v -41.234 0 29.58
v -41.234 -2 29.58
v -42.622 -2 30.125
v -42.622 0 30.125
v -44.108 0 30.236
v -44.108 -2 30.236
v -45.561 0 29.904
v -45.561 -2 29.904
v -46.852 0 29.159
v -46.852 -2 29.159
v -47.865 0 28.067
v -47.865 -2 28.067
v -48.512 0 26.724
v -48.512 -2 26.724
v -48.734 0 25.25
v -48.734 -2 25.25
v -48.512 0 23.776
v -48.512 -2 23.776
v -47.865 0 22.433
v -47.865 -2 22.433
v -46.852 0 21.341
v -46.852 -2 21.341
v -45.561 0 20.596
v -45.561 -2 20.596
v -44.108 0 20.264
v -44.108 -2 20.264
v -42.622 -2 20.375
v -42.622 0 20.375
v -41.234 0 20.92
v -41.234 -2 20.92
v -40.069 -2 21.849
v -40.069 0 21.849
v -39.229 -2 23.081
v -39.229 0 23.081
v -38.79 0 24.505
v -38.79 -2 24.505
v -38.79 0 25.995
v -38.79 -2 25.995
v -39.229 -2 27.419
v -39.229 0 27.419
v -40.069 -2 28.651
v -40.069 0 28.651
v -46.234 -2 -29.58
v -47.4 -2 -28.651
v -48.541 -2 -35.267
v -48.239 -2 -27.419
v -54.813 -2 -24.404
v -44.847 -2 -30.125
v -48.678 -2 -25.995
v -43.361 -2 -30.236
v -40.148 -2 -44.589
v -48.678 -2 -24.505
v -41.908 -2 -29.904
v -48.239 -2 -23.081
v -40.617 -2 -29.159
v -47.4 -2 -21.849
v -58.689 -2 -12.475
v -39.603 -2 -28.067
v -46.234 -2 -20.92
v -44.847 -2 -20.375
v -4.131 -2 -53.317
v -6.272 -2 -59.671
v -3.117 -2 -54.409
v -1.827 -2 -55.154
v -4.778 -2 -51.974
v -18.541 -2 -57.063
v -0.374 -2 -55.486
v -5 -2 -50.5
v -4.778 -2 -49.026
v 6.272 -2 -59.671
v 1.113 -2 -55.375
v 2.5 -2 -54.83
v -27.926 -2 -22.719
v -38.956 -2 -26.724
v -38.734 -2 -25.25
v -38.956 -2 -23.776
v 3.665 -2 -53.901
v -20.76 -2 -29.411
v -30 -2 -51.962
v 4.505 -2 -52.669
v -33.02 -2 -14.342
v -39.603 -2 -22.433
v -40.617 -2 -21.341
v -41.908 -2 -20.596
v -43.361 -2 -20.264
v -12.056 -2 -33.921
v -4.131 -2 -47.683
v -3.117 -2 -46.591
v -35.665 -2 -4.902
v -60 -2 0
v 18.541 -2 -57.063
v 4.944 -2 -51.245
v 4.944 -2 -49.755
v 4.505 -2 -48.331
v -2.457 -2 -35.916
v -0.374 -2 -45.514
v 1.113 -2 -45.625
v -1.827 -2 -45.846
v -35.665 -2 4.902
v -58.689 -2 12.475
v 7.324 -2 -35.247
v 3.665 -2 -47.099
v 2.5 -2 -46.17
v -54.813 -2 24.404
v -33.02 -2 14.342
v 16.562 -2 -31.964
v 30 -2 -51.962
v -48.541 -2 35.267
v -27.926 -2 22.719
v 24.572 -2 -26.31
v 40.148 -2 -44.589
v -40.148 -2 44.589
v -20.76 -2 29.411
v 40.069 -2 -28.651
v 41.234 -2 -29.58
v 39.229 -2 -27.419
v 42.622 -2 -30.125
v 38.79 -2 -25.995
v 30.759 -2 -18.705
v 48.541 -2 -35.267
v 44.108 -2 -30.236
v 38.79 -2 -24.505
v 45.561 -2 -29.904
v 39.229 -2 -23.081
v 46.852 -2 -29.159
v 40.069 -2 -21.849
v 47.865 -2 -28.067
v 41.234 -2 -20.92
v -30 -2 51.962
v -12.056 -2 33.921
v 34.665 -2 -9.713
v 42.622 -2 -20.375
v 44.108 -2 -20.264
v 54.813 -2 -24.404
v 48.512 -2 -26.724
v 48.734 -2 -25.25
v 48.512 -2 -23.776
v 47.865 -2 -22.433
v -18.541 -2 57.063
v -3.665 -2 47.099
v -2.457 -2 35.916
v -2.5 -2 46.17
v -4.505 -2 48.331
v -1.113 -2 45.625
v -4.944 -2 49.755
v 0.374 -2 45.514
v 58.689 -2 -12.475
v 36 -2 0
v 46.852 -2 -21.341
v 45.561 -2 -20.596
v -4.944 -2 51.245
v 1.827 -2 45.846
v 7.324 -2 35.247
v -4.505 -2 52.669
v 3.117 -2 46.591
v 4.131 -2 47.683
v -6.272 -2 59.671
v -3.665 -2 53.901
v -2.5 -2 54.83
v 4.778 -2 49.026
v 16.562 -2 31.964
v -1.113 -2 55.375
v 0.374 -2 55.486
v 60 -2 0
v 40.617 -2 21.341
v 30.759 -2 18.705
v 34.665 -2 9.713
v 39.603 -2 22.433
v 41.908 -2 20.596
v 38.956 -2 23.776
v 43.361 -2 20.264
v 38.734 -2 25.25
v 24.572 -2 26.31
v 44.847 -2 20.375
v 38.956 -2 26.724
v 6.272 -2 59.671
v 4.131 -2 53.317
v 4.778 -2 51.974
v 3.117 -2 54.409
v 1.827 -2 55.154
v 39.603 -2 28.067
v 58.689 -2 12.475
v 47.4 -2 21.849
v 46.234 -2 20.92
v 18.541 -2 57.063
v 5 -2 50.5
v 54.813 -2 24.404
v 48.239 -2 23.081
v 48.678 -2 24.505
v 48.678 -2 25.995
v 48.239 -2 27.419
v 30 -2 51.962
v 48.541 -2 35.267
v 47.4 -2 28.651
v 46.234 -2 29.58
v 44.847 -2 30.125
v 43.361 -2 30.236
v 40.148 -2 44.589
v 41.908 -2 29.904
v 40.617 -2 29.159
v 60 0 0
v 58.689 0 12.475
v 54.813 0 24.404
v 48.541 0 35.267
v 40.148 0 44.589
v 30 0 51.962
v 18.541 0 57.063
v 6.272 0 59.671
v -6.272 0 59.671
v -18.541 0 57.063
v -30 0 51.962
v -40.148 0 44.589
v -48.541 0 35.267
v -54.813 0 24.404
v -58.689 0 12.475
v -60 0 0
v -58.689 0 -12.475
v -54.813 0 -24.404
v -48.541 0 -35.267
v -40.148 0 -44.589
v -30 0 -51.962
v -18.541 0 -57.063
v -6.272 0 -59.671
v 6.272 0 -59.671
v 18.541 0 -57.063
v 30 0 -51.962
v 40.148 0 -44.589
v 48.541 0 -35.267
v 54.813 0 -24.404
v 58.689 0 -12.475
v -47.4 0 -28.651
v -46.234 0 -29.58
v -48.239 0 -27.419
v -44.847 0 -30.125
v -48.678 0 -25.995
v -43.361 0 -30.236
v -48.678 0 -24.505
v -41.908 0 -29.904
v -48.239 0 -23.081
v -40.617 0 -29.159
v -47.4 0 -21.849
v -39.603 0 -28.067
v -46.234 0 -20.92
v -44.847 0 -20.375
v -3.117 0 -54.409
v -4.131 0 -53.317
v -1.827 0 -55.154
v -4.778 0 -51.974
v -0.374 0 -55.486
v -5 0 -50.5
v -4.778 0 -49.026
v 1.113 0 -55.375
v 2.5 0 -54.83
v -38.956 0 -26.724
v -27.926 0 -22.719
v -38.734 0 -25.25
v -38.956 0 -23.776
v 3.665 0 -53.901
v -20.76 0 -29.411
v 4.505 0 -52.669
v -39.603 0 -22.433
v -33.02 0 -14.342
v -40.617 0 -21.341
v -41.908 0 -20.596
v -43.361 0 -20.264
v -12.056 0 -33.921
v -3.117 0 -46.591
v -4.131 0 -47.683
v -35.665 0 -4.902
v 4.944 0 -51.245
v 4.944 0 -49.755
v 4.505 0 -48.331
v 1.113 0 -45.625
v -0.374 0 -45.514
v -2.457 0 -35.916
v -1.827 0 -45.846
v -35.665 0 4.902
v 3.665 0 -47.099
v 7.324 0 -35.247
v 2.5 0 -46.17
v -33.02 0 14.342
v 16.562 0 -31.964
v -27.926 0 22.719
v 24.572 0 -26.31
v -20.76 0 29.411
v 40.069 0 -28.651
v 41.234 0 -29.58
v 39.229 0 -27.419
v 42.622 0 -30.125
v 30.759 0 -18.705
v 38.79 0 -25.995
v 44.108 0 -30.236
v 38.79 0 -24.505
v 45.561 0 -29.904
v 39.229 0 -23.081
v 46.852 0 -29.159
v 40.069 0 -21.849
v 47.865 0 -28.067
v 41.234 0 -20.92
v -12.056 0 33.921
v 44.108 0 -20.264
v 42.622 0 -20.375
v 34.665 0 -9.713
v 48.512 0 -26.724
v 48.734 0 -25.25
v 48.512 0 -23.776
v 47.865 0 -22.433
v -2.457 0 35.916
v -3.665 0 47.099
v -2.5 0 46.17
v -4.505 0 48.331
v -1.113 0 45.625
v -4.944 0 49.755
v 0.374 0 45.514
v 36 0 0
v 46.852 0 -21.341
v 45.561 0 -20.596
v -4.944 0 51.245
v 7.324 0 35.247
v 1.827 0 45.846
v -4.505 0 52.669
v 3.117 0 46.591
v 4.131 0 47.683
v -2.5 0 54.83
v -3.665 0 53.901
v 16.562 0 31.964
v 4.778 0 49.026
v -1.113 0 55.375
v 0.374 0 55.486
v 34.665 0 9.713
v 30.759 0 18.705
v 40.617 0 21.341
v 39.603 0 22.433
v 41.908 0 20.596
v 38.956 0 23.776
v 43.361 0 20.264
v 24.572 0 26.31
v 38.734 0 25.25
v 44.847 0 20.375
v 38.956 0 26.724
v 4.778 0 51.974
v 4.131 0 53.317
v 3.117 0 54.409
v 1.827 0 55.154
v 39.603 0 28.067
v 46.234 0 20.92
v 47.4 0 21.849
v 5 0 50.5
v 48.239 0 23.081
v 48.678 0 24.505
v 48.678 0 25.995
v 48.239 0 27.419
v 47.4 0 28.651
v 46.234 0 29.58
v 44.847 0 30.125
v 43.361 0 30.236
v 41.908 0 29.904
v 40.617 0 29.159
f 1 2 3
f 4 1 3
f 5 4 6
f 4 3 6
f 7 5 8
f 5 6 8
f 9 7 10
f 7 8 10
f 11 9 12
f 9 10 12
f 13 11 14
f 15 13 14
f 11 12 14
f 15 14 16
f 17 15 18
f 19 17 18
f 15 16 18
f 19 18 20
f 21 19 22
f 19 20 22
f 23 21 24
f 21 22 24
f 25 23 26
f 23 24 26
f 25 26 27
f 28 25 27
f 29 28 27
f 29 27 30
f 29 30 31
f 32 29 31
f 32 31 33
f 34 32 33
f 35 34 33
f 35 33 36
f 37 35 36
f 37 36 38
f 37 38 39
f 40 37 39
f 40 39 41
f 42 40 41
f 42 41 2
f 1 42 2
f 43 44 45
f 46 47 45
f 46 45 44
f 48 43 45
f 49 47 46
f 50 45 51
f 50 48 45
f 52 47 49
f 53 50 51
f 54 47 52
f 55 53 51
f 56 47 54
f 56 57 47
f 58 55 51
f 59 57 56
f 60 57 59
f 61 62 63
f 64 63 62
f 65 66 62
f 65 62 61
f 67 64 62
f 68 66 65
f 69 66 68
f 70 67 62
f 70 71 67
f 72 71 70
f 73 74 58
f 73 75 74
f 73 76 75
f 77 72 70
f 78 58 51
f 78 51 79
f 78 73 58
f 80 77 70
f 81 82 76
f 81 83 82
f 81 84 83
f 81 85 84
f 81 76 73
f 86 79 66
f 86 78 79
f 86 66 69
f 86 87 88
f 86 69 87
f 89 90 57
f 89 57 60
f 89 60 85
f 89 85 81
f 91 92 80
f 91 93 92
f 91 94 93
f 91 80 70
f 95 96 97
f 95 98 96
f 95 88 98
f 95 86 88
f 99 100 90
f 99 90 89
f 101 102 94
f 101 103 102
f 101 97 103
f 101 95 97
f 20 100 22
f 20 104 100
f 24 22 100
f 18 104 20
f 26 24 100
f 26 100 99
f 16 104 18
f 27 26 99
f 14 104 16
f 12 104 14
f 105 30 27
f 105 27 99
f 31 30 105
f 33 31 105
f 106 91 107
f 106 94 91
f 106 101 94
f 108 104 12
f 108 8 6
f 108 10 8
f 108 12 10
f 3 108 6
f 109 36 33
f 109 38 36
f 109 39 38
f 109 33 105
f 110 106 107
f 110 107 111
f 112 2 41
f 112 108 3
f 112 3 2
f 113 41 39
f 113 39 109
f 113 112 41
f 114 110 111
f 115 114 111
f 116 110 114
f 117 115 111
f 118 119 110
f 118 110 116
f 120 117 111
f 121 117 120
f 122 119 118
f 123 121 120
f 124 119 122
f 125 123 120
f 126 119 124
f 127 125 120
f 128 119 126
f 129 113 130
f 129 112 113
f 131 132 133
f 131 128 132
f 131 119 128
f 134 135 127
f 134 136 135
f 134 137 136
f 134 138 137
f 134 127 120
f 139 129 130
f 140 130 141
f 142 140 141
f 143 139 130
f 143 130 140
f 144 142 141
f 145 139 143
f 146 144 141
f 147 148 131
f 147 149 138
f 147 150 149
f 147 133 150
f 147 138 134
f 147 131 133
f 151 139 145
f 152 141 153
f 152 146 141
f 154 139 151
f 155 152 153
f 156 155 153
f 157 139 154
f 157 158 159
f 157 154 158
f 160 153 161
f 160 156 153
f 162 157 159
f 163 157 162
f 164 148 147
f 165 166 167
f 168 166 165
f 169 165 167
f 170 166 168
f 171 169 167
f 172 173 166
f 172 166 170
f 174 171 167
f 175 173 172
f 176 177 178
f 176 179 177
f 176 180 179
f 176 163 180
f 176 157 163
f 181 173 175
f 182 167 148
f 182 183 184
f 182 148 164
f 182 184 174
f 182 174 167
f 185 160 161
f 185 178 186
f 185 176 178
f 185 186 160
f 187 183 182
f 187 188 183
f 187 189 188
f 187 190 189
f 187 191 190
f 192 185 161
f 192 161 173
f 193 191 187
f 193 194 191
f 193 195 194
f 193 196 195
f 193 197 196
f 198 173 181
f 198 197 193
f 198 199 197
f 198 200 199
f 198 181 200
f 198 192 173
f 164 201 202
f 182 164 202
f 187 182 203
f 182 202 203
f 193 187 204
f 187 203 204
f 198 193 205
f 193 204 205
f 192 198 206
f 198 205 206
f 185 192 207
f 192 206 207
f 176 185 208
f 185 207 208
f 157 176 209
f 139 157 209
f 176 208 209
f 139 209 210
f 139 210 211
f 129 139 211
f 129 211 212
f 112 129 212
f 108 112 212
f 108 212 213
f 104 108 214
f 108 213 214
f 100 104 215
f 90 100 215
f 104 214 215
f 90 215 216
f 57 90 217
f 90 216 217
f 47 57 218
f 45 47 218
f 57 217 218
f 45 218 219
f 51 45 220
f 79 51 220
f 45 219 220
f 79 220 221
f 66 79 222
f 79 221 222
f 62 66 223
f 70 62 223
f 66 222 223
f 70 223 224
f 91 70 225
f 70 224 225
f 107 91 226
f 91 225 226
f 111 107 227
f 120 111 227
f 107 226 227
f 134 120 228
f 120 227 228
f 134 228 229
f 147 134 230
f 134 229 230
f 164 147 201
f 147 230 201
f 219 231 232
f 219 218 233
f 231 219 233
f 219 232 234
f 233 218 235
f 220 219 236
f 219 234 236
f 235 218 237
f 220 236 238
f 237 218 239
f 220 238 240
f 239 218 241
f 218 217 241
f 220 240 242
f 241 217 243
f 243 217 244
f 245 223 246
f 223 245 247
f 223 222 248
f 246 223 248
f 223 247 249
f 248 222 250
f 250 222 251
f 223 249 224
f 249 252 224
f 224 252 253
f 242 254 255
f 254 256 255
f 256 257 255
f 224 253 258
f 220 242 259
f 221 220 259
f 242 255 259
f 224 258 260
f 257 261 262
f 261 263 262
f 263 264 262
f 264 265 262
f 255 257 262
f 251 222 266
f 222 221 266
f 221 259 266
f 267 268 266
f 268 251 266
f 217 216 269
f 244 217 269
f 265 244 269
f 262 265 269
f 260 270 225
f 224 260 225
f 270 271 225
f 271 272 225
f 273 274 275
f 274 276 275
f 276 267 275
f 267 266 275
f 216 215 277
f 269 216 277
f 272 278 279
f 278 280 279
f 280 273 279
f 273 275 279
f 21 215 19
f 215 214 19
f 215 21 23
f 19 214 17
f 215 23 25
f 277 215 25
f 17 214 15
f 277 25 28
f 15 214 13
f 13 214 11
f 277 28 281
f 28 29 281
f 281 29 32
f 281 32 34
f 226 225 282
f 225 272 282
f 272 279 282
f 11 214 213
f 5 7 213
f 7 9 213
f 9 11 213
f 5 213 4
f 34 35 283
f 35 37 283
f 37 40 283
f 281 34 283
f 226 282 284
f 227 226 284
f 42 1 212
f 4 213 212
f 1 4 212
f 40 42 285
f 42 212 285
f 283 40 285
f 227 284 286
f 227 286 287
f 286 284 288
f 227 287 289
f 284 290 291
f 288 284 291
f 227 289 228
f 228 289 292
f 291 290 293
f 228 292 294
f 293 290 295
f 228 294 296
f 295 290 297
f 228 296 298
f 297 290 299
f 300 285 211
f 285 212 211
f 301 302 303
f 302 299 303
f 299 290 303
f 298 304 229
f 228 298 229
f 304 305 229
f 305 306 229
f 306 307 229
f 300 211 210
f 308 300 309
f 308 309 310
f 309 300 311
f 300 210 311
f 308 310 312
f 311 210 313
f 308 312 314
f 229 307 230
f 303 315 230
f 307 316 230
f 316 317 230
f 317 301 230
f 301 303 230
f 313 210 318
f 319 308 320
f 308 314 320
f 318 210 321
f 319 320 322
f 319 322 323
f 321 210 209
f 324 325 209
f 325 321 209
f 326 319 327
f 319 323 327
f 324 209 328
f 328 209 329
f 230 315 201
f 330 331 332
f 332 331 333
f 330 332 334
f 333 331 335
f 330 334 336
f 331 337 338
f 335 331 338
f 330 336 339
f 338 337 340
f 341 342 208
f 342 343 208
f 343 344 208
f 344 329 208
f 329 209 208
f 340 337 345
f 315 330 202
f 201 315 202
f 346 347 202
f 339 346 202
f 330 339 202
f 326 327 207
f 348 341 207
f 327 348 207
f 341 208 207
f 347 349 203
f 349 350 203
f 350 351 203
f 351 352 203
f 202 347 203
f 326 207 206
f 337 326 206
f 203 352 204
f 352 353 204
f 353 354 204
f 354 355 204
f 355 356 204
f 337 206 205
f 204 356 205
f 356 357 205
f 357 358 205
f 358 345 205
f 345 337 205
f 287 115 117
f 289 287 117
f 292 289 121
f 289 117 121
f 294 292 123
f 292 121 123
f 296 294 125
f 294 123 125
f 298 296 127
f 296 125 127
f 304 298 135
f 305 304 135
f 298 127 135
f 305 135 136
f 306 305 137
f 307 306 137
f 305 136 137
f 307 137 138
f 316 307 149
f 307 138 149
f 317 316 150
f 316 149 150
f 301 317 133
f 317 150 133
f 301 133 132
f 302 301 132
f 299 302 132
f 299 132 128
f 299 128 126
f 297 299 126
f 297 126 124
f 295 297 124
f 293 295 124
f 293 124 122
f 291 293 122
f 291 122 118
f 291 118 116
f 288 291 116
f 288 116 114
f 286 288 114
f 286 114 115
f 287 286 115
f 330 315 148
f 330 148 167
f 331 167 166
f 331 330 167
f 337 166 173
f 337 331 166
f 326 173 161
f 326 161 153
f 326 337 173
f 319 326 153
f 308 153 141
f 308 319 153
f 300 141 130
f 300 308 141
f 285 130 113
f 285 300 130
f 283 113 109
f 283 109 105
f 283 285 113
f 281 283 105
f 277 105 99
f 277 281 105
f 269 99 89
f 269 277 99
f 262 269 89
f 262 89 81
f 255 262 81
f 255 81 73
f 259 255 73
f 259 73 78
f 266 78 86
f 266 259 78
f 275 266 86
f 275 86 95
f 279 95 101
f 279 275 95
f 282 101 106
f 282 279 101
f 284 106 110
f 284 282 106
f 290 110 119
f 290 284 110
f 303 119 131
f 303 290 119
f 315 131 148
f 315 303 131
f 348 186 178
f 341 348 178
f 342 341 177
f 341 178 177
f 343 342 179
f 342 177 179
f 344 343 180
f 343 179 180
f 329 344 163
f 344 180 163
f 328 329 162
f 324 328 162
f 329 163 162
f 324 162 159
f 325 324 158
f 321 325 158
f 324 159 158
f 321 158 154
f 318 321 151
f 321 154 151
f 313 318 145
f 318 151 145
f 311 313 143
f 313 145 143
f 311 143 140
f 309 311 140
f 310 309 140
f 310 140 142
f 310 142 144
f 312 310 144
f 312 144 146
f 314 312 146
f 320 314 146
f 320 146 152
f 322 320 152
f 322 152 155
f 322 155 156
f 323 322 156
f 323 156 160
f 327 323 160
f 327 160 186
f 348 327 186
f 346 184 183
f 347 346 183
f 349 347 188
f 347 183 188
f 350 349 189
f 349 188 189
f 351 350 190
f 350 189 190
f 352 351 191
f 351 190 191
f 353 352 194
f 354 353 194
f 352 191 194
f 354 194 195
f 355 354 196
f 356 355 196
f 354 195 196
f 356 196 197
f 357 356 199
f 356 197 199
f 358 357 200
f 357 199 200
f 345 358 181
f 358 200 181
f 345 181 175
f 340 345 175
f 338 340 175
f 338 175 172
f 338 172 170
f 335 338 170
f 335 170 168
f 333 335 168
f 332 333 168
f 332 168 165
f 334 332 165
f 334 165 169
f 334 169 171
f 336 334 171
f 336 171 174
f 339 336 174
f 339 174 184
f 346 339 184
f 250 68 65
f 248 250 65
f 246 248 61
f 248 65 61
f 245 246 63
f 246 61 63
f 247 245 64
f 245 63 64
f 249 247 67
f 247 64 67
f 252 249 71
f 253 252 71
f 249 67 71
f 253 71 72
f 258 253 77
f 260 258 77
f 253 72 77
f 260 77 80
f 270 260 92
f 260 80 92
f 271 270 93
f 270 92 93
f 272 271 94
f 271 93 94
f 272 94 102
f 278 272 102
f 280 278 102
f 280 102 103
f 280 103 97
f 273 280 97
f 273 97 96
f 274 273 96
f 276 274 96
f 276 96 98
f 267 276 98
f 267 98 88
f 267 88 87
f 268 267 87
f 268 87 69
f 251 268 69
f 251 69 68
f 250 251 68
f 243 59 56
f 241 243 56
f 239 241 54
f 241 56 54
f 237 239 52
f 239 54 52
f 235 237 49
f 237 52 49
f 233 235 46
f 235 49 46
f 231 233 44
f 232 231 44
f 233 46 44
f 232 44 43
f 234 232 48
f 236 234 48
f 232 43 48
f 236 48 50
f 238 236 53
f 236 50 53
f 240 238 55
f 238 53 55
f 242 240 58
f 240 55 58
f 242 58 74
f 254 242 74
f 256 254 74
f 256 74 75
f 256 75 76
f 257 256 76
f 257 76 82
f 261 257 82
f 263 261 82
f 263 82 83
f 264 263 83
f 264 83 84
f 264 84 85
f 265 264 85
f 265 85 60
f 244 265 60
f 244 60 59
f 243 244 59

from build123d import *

# Parameters (mm, degrees)
F0_R            = 60
F0_R_2          = 36
F1_DEPTH        = 2
F2_R            = 5
F3_DEPTH        = 2.001
F3_COPIES_COUNT = 6


# Not quite as in the source:
# - a pattern or mirror of a feature is missing from the dataset's text; its kind, count and spacing are read off the source's solid


with BuildPart() as f1:
    # F0 (on Front) → F1 (new body)
    with BuildSketch(Plane.XZ):
        Circle(F0_R)
        Circle(F0_R_2, mode=Mode.SUBTRACT)
    extrude(amount=F1_DEPTH)

    # F2 (on face) → F3 (cut, through all)
    with BuildSketch(Plane.XZ.offset(2)):
        with Locations((0, 50.5)):
            Circle(F2_R)
    f3 = extrude(amount=-F3_DEPTH, mode=Mode.SUBTRACT)

    # F3_copies: F3 ×6 about axis
    f3_copies_axis = Axis((0, 0, 0), (0, 1, 0))
    for i in range(1, F3_COPIES_COUNT):
        add(f3.rotate(f3_copies_axis, i * 360 / F3_COPIES_COUNT), mode=Mode.SUBTRACT)


solid = f1.part
